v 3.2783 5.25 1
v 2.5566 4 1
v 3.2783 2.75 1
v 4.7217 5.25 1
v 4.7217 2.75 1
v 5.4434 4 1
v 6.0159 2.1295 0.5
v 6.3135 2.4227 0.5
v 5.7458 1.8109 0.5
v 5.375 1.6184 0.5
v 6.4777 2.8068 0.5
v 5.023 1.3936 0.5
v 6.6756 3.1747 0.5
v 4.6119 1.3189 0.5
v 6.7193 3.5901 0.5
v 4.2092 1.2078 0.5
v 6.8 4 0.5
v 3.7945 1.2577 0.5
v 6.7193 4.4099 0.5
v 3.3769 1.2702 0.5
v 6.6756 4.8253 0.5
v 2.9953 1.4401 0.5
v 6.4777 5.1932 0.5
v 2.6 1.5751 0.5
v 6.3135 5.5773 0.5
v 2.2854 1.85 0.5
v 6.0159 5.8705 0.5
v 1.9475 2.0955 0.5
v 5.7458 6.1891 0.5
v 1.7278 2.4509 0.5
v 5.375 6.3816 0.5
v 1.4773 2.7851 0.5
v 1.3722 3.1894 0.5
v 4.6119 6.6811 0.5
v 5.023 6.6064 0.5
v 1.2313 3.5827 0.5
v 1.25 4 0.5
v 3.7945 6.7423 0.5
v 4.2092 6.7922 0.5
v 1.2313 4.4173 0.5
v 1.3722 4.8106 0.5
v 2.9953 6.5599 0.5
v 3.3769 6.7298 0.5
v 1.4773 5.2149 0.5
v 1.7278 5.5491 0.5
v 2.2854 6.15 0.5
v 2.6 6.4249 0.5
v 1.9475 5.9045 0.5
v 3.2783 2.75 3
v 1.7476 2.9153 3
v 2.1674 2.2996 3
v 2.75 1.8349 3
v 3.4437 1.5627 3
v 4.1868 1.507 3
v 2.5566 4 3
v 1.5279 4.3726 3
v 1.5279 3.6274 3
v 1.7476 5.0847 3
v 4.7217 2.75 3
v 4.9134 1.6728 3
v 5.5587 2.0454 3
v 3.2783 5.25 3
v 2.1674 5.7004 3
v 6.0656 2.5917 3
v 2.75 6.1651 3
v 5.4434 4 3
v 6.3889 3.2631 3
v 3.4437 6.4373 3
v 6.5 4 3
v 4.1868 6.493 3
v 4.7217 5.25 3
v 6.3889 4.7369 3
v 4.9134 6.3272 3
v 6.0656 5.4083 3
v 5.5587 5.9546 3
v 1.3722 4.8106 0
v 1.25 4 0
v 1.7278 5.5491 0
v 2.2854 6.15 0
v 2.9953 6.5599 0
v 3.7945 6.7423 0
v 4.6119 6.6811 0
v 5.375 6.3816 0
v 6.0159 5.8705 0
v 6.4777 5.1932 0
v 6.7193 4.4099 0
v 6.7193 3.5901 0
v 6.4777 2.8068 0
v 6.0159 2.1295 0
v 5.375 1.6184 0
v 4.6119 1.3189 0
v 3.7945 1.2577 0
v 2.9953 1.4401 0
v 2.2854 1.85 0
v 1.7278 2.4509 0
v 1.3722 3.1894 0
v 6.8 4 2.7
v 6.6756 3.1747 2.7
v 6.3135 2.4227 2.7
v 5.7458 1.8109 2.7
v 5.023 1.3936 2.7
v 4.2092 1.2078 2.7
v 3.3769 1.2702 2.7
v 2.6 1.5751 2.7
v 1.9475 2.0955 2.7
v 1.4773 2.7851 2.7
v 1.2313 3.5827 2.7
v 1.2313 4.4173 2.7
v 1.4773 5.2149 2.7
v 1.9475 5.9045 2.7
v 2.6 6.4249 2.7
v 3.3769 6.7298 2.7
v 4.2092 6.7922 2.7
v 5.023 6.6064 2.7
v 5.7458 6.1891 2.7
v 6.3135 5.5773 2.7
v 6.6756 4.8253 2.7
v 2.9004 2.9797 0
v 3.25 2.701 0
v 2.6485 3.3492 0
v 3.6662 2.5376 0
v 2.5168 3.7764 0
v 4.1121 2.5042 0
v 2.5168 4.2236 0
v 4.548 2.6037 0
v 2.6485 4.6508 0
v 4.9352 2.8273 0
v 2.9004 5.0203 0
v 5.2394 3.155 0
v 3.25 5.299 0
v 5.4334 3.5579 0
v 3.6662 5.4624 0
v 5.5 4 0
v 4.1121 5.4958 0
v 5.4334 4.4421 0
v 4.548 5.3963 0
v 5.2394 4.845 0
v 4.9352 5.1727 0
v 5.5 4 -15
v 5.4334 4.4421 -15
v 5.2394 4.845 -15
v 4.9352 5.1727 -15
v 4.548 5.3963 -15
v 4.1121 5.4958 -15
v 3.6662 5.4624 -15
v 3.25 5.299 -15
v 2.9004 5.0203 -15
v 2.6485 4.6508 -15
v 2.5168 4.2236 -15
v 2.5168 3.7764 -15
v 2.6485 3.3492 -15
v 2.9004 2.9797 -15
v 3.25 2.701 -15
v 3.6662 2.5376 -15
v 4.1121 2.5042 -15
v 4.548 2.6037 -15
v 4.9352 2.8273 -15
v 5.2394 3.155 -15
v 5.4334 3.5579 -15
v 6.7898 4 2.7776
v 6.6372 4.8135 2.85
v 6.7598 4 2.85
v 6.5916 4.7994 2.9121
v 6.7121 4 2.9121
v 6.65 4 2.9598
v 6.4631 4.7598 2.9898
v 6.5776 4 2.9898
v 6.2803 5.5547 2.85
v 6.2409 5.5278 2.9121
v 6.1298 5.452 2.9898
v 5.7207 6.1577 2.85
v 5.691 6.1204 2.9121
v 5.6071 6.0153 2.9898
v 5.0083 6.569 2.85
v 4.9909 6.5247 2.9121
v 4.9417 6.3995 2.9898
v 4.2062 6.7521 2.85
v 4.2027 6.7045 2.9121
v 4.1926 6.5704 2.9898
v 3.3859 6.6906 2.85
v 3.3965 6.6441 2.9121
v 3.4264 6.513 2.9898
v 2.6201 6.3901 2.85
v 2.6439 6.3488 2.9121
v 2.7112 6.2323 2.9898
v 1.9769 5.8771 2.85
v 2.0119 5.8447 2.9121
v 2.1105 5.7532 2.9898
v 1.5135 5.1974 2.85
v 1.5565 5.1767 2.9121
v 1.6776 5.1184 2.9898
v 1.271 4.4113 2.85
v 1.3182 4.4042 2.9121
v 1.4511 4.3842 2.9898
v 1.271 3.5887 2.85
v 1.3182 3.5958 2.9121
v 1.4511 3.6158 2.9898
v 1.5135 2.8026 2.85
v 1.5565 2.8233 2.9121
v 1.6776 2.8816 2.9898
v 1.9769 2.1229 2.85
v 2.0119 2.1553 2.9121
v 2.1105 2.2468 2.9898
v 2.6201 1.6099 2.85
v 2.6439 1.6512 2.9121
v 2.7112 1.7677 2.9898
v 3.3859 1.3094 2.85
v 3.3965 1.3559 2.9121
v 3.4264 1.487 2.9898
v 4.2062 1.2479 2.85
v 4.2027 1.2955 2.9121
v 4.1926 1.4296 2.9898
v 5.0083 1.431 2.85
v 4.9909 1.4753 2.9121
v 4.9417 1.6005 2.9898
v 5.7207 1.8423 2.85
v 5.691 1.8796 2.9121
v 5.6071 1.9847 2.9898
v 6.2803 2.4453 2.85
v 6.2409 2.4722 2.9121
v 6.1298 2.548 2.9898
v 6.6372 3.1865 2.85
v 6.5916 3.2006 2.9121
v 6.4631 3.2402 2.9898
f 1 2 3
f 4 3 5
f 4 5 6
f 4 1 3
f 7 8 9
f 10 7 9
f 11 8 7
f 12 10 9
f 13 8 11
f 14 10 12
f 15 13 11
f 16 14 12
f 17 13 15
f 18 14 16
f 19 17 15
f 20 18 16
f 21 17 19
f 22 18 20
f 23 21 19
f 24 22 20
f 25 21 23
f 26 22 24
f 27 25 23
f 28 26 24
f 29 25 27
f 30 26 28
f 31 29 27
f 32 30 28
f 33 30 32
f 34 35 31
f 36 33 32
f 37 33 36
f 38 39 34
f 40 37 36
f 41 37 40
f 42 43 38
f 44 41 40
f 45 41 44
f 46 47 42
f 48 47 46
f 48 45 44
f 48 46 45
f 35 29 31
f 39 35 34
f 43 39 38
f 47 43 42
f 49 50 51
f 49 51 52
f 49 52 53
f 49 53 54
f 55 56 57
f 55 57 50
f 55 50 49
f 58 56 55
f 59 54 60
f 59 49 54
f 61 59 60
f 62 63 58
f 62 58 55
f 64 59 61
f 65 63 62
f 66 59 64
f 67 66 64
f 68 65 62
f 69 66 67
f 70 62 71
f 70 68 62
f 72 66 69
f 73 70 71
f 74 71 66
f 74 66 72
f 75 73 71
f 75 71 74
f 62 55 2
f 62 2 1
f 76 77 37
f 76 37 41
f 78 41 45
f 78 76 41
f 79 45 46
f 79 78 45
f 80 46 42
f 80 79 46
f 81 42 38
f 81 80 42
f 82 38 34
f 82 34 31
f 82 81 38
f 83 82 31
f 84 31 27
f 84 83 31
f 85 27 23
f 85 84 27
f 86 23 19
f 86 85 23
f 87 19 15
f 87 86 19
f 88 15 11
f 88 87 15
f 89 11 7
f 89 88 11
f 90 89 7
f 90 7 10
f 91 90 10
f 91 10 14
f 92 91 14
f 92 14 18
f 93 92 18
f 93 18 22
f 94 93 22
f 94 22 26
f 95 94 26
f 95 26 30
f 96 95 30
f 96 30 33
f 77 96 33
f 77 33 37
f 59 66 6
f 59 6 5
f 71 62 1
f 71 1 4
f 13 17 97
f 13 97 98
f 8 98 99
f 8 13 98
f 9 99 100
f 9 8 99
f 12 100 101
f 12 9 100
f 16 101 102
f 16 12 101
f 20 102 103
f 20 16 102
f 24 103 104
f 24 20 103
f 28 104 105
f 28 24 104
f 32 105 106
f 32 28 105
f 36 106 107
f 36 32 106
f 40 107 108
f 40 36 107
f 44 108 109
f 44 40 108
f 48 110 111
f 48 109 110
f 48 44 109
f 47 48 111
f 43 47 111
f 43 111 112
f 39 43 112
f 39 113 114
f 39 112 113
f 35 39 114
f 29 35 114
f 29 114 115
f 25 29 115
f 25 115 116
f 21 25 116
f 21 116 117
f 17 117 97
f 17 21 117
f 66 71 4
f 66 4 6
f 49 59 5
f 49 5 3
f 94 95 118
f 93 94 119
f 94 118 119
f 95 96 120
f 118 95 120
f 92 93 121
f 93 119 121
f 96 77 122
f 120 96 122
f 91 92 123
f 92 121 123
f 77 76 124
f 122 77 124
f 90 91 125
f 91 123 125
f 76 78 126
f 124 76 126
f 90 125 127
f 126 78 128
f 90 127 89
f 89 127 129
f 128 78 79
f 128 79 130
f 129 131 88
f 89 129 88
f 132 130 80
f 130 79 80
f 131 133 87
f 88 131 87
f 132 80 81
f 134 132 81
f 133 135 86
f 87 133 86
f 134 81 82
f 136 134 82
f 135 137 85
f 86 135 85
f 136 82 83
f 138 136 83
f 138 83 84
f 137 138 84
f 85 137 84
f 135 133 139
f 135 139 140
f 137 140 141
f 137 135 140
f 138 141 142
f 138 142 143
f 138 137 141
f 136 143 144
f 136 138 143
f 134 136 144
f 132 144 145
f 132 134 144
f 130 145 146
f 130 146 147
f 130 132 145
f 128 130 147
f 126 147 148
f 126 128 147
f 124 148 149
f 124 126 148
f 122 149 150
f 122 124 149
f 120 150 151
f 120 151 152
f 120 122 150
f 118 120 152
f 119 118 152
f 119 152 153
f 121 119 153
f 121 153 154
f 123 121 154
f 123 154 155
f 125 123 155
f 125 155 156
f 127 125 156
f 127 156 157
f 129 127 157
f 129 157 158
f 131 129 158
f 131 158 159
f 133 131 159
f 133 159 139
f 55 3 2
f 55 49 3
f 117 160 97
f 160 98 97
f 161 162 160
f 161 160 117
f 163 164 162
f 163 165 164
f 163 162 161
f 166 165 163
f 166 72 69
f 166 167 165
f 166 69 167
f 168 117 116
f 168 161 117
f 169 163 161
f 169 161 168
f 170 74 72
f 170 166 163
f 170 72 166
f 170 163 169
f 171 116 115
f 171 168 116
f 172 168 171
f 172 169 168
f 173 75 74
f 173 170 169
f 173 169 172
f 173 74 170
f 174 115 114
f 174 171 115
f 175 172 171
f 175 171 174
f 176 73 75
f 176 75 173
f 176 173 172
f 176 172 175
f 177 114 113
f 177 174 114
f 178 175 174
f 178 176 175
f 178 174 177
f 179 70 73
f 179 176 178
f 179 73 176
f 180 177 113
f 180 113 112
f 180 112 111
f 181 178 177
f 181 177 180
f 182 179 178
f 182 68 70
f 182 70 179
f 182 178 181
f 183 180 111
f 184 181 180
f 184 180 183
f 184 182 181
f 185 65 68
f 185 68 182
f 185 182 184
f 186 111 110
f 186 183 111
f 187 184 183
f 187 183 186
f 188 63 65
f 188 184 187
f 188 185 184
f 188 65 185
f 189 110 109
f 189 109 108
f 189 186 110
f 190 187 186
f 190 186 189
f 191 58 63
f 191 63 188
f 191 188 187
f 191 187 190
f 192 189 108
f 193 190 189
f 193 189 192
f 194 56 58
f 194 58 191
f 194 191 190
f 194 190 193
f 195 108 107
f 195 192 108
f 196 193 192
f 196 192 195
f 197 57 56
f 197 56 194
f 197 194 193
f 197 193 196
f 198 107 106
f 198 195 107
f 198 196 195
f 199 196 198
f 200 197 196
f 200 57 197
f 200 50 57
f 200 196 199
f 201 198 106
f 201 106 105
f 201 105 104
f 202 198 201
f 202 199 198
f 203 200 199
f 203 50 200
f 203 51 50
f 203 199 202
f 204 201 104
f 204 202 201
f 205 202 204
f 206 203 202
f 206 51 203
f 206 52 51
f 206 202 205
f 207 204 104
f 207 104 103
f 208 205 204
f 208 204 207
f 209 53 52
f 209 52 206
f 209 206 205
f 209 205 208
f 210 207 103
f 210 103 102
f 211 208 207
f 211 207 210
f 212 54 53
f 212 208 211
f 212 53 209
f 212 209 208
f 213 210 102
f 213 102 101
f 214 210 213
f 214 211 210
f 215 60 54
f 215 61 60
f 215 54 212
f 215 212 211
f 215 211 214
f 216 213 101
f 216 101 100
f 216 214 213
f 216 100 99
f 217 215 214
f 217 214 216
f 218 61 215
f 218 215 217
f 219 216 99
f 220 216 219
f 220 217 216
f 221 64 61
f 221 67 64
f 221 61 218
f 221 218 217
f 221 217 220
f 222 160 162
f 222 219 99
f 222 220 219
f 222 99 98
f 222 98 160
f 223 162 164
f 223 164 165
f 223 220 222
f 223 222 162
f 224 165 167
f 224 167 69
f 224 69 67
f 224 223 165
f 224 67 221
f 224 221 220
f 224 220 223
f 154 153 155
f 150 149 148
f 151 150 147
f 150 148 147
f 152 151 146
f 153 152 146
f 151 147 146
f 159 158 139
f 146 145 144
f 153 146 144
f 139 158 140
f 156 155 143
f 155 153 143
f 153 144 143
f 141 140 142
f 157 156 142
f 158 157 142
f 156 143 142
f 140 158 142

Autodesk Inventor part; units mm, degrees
ref_plane "YZ Plane" through (0, 0, 0) normal (1, 0, 0) x (0, 1, 0)
ref_plane "XZ Plane" through (0, 0, 0) normal (0, 1, 0) x (-1, 0, 0)
ref_plane "XY Plane" through (0, 0, 0) normal (0, 0, 1) x (1, 0, 0)
sketch "Sketch1" plane through (0, 0, 0) normal (0, 0, 1) x (1, 0, 0)
  circle A0 centre (4, 4) radius 1.2 projected
  circle A1 centre (4, 4) radius 1.5
  point P0 (0, 0)
  dimension "d0" = 3
extrude "Extrusion1" add sketch "Sketch1" against normal blind 15 contours A0 | A1
sketch "Sketch2" plane through (4, 4, 0) normal (0, 0, 1) x (1, 0, 0)
  circle A0 centre (0, 0) radius 1.5 projected
  circle A1 centre (0, 0) radius 2.8
  point P0 (-4, -4)
  dimension "d3" = 5.6
extrude "Extrusion2" add sketch "Sketch2" along normal blind 3 contours A0 | A1
fillet "Fillet1" radius 0.3 1 edges at (1.2, 4, 3)
sketch "Sketch3" plane through (4, 4, 0) normal (0, 0, -1) x (-1, 0, 0)
  circle A0 centre (0, 0) radius 2.8 projected
  circle A1 centre (0, 0) radius 1.5 projected
  circle A2 centre (0, 0) radius 2.75
  point P0 (4, -4)
  dimension "d7" = 5.5
extrude "Extrusion3" cut sketch "Sketch3" against normal blind 0.5 contours A0
sketch "Sketch4" plane through (4, 4, 3) normal (0, 0, 1) x (1, 0, 0)
  circle A0 centre (0, 0) radius 2.5 projected
  line L0 (0.7217, 1.25) -> (1.4434, 0)
  line L1 (1.4434, 0) -> (0.7217, -1.25)
  line L2 (0.7217, -1.25) -> (-0.7217, -1.25)
  line L3 (-0.7217, -1.25) -> (-1.4434, 0)
  line L4 (-1.4434, 0) -> (-0.7217, 1.25)
  line L5 (-0.7217, 1.25) -> (0.7217, 1.25)
  point P0 (-4, -4)
  dimension "d10" = 2.5
extrude "Extrusion4" cut sketch "Sketch4" against normal blind 2 contours L0 L1 L2 L3 L4 L5
thread "Thread1" size "M3x0.5" class "6g" standard "ANSI Metric M Profile" full length
properties part number "m3 6" material "Steel"
